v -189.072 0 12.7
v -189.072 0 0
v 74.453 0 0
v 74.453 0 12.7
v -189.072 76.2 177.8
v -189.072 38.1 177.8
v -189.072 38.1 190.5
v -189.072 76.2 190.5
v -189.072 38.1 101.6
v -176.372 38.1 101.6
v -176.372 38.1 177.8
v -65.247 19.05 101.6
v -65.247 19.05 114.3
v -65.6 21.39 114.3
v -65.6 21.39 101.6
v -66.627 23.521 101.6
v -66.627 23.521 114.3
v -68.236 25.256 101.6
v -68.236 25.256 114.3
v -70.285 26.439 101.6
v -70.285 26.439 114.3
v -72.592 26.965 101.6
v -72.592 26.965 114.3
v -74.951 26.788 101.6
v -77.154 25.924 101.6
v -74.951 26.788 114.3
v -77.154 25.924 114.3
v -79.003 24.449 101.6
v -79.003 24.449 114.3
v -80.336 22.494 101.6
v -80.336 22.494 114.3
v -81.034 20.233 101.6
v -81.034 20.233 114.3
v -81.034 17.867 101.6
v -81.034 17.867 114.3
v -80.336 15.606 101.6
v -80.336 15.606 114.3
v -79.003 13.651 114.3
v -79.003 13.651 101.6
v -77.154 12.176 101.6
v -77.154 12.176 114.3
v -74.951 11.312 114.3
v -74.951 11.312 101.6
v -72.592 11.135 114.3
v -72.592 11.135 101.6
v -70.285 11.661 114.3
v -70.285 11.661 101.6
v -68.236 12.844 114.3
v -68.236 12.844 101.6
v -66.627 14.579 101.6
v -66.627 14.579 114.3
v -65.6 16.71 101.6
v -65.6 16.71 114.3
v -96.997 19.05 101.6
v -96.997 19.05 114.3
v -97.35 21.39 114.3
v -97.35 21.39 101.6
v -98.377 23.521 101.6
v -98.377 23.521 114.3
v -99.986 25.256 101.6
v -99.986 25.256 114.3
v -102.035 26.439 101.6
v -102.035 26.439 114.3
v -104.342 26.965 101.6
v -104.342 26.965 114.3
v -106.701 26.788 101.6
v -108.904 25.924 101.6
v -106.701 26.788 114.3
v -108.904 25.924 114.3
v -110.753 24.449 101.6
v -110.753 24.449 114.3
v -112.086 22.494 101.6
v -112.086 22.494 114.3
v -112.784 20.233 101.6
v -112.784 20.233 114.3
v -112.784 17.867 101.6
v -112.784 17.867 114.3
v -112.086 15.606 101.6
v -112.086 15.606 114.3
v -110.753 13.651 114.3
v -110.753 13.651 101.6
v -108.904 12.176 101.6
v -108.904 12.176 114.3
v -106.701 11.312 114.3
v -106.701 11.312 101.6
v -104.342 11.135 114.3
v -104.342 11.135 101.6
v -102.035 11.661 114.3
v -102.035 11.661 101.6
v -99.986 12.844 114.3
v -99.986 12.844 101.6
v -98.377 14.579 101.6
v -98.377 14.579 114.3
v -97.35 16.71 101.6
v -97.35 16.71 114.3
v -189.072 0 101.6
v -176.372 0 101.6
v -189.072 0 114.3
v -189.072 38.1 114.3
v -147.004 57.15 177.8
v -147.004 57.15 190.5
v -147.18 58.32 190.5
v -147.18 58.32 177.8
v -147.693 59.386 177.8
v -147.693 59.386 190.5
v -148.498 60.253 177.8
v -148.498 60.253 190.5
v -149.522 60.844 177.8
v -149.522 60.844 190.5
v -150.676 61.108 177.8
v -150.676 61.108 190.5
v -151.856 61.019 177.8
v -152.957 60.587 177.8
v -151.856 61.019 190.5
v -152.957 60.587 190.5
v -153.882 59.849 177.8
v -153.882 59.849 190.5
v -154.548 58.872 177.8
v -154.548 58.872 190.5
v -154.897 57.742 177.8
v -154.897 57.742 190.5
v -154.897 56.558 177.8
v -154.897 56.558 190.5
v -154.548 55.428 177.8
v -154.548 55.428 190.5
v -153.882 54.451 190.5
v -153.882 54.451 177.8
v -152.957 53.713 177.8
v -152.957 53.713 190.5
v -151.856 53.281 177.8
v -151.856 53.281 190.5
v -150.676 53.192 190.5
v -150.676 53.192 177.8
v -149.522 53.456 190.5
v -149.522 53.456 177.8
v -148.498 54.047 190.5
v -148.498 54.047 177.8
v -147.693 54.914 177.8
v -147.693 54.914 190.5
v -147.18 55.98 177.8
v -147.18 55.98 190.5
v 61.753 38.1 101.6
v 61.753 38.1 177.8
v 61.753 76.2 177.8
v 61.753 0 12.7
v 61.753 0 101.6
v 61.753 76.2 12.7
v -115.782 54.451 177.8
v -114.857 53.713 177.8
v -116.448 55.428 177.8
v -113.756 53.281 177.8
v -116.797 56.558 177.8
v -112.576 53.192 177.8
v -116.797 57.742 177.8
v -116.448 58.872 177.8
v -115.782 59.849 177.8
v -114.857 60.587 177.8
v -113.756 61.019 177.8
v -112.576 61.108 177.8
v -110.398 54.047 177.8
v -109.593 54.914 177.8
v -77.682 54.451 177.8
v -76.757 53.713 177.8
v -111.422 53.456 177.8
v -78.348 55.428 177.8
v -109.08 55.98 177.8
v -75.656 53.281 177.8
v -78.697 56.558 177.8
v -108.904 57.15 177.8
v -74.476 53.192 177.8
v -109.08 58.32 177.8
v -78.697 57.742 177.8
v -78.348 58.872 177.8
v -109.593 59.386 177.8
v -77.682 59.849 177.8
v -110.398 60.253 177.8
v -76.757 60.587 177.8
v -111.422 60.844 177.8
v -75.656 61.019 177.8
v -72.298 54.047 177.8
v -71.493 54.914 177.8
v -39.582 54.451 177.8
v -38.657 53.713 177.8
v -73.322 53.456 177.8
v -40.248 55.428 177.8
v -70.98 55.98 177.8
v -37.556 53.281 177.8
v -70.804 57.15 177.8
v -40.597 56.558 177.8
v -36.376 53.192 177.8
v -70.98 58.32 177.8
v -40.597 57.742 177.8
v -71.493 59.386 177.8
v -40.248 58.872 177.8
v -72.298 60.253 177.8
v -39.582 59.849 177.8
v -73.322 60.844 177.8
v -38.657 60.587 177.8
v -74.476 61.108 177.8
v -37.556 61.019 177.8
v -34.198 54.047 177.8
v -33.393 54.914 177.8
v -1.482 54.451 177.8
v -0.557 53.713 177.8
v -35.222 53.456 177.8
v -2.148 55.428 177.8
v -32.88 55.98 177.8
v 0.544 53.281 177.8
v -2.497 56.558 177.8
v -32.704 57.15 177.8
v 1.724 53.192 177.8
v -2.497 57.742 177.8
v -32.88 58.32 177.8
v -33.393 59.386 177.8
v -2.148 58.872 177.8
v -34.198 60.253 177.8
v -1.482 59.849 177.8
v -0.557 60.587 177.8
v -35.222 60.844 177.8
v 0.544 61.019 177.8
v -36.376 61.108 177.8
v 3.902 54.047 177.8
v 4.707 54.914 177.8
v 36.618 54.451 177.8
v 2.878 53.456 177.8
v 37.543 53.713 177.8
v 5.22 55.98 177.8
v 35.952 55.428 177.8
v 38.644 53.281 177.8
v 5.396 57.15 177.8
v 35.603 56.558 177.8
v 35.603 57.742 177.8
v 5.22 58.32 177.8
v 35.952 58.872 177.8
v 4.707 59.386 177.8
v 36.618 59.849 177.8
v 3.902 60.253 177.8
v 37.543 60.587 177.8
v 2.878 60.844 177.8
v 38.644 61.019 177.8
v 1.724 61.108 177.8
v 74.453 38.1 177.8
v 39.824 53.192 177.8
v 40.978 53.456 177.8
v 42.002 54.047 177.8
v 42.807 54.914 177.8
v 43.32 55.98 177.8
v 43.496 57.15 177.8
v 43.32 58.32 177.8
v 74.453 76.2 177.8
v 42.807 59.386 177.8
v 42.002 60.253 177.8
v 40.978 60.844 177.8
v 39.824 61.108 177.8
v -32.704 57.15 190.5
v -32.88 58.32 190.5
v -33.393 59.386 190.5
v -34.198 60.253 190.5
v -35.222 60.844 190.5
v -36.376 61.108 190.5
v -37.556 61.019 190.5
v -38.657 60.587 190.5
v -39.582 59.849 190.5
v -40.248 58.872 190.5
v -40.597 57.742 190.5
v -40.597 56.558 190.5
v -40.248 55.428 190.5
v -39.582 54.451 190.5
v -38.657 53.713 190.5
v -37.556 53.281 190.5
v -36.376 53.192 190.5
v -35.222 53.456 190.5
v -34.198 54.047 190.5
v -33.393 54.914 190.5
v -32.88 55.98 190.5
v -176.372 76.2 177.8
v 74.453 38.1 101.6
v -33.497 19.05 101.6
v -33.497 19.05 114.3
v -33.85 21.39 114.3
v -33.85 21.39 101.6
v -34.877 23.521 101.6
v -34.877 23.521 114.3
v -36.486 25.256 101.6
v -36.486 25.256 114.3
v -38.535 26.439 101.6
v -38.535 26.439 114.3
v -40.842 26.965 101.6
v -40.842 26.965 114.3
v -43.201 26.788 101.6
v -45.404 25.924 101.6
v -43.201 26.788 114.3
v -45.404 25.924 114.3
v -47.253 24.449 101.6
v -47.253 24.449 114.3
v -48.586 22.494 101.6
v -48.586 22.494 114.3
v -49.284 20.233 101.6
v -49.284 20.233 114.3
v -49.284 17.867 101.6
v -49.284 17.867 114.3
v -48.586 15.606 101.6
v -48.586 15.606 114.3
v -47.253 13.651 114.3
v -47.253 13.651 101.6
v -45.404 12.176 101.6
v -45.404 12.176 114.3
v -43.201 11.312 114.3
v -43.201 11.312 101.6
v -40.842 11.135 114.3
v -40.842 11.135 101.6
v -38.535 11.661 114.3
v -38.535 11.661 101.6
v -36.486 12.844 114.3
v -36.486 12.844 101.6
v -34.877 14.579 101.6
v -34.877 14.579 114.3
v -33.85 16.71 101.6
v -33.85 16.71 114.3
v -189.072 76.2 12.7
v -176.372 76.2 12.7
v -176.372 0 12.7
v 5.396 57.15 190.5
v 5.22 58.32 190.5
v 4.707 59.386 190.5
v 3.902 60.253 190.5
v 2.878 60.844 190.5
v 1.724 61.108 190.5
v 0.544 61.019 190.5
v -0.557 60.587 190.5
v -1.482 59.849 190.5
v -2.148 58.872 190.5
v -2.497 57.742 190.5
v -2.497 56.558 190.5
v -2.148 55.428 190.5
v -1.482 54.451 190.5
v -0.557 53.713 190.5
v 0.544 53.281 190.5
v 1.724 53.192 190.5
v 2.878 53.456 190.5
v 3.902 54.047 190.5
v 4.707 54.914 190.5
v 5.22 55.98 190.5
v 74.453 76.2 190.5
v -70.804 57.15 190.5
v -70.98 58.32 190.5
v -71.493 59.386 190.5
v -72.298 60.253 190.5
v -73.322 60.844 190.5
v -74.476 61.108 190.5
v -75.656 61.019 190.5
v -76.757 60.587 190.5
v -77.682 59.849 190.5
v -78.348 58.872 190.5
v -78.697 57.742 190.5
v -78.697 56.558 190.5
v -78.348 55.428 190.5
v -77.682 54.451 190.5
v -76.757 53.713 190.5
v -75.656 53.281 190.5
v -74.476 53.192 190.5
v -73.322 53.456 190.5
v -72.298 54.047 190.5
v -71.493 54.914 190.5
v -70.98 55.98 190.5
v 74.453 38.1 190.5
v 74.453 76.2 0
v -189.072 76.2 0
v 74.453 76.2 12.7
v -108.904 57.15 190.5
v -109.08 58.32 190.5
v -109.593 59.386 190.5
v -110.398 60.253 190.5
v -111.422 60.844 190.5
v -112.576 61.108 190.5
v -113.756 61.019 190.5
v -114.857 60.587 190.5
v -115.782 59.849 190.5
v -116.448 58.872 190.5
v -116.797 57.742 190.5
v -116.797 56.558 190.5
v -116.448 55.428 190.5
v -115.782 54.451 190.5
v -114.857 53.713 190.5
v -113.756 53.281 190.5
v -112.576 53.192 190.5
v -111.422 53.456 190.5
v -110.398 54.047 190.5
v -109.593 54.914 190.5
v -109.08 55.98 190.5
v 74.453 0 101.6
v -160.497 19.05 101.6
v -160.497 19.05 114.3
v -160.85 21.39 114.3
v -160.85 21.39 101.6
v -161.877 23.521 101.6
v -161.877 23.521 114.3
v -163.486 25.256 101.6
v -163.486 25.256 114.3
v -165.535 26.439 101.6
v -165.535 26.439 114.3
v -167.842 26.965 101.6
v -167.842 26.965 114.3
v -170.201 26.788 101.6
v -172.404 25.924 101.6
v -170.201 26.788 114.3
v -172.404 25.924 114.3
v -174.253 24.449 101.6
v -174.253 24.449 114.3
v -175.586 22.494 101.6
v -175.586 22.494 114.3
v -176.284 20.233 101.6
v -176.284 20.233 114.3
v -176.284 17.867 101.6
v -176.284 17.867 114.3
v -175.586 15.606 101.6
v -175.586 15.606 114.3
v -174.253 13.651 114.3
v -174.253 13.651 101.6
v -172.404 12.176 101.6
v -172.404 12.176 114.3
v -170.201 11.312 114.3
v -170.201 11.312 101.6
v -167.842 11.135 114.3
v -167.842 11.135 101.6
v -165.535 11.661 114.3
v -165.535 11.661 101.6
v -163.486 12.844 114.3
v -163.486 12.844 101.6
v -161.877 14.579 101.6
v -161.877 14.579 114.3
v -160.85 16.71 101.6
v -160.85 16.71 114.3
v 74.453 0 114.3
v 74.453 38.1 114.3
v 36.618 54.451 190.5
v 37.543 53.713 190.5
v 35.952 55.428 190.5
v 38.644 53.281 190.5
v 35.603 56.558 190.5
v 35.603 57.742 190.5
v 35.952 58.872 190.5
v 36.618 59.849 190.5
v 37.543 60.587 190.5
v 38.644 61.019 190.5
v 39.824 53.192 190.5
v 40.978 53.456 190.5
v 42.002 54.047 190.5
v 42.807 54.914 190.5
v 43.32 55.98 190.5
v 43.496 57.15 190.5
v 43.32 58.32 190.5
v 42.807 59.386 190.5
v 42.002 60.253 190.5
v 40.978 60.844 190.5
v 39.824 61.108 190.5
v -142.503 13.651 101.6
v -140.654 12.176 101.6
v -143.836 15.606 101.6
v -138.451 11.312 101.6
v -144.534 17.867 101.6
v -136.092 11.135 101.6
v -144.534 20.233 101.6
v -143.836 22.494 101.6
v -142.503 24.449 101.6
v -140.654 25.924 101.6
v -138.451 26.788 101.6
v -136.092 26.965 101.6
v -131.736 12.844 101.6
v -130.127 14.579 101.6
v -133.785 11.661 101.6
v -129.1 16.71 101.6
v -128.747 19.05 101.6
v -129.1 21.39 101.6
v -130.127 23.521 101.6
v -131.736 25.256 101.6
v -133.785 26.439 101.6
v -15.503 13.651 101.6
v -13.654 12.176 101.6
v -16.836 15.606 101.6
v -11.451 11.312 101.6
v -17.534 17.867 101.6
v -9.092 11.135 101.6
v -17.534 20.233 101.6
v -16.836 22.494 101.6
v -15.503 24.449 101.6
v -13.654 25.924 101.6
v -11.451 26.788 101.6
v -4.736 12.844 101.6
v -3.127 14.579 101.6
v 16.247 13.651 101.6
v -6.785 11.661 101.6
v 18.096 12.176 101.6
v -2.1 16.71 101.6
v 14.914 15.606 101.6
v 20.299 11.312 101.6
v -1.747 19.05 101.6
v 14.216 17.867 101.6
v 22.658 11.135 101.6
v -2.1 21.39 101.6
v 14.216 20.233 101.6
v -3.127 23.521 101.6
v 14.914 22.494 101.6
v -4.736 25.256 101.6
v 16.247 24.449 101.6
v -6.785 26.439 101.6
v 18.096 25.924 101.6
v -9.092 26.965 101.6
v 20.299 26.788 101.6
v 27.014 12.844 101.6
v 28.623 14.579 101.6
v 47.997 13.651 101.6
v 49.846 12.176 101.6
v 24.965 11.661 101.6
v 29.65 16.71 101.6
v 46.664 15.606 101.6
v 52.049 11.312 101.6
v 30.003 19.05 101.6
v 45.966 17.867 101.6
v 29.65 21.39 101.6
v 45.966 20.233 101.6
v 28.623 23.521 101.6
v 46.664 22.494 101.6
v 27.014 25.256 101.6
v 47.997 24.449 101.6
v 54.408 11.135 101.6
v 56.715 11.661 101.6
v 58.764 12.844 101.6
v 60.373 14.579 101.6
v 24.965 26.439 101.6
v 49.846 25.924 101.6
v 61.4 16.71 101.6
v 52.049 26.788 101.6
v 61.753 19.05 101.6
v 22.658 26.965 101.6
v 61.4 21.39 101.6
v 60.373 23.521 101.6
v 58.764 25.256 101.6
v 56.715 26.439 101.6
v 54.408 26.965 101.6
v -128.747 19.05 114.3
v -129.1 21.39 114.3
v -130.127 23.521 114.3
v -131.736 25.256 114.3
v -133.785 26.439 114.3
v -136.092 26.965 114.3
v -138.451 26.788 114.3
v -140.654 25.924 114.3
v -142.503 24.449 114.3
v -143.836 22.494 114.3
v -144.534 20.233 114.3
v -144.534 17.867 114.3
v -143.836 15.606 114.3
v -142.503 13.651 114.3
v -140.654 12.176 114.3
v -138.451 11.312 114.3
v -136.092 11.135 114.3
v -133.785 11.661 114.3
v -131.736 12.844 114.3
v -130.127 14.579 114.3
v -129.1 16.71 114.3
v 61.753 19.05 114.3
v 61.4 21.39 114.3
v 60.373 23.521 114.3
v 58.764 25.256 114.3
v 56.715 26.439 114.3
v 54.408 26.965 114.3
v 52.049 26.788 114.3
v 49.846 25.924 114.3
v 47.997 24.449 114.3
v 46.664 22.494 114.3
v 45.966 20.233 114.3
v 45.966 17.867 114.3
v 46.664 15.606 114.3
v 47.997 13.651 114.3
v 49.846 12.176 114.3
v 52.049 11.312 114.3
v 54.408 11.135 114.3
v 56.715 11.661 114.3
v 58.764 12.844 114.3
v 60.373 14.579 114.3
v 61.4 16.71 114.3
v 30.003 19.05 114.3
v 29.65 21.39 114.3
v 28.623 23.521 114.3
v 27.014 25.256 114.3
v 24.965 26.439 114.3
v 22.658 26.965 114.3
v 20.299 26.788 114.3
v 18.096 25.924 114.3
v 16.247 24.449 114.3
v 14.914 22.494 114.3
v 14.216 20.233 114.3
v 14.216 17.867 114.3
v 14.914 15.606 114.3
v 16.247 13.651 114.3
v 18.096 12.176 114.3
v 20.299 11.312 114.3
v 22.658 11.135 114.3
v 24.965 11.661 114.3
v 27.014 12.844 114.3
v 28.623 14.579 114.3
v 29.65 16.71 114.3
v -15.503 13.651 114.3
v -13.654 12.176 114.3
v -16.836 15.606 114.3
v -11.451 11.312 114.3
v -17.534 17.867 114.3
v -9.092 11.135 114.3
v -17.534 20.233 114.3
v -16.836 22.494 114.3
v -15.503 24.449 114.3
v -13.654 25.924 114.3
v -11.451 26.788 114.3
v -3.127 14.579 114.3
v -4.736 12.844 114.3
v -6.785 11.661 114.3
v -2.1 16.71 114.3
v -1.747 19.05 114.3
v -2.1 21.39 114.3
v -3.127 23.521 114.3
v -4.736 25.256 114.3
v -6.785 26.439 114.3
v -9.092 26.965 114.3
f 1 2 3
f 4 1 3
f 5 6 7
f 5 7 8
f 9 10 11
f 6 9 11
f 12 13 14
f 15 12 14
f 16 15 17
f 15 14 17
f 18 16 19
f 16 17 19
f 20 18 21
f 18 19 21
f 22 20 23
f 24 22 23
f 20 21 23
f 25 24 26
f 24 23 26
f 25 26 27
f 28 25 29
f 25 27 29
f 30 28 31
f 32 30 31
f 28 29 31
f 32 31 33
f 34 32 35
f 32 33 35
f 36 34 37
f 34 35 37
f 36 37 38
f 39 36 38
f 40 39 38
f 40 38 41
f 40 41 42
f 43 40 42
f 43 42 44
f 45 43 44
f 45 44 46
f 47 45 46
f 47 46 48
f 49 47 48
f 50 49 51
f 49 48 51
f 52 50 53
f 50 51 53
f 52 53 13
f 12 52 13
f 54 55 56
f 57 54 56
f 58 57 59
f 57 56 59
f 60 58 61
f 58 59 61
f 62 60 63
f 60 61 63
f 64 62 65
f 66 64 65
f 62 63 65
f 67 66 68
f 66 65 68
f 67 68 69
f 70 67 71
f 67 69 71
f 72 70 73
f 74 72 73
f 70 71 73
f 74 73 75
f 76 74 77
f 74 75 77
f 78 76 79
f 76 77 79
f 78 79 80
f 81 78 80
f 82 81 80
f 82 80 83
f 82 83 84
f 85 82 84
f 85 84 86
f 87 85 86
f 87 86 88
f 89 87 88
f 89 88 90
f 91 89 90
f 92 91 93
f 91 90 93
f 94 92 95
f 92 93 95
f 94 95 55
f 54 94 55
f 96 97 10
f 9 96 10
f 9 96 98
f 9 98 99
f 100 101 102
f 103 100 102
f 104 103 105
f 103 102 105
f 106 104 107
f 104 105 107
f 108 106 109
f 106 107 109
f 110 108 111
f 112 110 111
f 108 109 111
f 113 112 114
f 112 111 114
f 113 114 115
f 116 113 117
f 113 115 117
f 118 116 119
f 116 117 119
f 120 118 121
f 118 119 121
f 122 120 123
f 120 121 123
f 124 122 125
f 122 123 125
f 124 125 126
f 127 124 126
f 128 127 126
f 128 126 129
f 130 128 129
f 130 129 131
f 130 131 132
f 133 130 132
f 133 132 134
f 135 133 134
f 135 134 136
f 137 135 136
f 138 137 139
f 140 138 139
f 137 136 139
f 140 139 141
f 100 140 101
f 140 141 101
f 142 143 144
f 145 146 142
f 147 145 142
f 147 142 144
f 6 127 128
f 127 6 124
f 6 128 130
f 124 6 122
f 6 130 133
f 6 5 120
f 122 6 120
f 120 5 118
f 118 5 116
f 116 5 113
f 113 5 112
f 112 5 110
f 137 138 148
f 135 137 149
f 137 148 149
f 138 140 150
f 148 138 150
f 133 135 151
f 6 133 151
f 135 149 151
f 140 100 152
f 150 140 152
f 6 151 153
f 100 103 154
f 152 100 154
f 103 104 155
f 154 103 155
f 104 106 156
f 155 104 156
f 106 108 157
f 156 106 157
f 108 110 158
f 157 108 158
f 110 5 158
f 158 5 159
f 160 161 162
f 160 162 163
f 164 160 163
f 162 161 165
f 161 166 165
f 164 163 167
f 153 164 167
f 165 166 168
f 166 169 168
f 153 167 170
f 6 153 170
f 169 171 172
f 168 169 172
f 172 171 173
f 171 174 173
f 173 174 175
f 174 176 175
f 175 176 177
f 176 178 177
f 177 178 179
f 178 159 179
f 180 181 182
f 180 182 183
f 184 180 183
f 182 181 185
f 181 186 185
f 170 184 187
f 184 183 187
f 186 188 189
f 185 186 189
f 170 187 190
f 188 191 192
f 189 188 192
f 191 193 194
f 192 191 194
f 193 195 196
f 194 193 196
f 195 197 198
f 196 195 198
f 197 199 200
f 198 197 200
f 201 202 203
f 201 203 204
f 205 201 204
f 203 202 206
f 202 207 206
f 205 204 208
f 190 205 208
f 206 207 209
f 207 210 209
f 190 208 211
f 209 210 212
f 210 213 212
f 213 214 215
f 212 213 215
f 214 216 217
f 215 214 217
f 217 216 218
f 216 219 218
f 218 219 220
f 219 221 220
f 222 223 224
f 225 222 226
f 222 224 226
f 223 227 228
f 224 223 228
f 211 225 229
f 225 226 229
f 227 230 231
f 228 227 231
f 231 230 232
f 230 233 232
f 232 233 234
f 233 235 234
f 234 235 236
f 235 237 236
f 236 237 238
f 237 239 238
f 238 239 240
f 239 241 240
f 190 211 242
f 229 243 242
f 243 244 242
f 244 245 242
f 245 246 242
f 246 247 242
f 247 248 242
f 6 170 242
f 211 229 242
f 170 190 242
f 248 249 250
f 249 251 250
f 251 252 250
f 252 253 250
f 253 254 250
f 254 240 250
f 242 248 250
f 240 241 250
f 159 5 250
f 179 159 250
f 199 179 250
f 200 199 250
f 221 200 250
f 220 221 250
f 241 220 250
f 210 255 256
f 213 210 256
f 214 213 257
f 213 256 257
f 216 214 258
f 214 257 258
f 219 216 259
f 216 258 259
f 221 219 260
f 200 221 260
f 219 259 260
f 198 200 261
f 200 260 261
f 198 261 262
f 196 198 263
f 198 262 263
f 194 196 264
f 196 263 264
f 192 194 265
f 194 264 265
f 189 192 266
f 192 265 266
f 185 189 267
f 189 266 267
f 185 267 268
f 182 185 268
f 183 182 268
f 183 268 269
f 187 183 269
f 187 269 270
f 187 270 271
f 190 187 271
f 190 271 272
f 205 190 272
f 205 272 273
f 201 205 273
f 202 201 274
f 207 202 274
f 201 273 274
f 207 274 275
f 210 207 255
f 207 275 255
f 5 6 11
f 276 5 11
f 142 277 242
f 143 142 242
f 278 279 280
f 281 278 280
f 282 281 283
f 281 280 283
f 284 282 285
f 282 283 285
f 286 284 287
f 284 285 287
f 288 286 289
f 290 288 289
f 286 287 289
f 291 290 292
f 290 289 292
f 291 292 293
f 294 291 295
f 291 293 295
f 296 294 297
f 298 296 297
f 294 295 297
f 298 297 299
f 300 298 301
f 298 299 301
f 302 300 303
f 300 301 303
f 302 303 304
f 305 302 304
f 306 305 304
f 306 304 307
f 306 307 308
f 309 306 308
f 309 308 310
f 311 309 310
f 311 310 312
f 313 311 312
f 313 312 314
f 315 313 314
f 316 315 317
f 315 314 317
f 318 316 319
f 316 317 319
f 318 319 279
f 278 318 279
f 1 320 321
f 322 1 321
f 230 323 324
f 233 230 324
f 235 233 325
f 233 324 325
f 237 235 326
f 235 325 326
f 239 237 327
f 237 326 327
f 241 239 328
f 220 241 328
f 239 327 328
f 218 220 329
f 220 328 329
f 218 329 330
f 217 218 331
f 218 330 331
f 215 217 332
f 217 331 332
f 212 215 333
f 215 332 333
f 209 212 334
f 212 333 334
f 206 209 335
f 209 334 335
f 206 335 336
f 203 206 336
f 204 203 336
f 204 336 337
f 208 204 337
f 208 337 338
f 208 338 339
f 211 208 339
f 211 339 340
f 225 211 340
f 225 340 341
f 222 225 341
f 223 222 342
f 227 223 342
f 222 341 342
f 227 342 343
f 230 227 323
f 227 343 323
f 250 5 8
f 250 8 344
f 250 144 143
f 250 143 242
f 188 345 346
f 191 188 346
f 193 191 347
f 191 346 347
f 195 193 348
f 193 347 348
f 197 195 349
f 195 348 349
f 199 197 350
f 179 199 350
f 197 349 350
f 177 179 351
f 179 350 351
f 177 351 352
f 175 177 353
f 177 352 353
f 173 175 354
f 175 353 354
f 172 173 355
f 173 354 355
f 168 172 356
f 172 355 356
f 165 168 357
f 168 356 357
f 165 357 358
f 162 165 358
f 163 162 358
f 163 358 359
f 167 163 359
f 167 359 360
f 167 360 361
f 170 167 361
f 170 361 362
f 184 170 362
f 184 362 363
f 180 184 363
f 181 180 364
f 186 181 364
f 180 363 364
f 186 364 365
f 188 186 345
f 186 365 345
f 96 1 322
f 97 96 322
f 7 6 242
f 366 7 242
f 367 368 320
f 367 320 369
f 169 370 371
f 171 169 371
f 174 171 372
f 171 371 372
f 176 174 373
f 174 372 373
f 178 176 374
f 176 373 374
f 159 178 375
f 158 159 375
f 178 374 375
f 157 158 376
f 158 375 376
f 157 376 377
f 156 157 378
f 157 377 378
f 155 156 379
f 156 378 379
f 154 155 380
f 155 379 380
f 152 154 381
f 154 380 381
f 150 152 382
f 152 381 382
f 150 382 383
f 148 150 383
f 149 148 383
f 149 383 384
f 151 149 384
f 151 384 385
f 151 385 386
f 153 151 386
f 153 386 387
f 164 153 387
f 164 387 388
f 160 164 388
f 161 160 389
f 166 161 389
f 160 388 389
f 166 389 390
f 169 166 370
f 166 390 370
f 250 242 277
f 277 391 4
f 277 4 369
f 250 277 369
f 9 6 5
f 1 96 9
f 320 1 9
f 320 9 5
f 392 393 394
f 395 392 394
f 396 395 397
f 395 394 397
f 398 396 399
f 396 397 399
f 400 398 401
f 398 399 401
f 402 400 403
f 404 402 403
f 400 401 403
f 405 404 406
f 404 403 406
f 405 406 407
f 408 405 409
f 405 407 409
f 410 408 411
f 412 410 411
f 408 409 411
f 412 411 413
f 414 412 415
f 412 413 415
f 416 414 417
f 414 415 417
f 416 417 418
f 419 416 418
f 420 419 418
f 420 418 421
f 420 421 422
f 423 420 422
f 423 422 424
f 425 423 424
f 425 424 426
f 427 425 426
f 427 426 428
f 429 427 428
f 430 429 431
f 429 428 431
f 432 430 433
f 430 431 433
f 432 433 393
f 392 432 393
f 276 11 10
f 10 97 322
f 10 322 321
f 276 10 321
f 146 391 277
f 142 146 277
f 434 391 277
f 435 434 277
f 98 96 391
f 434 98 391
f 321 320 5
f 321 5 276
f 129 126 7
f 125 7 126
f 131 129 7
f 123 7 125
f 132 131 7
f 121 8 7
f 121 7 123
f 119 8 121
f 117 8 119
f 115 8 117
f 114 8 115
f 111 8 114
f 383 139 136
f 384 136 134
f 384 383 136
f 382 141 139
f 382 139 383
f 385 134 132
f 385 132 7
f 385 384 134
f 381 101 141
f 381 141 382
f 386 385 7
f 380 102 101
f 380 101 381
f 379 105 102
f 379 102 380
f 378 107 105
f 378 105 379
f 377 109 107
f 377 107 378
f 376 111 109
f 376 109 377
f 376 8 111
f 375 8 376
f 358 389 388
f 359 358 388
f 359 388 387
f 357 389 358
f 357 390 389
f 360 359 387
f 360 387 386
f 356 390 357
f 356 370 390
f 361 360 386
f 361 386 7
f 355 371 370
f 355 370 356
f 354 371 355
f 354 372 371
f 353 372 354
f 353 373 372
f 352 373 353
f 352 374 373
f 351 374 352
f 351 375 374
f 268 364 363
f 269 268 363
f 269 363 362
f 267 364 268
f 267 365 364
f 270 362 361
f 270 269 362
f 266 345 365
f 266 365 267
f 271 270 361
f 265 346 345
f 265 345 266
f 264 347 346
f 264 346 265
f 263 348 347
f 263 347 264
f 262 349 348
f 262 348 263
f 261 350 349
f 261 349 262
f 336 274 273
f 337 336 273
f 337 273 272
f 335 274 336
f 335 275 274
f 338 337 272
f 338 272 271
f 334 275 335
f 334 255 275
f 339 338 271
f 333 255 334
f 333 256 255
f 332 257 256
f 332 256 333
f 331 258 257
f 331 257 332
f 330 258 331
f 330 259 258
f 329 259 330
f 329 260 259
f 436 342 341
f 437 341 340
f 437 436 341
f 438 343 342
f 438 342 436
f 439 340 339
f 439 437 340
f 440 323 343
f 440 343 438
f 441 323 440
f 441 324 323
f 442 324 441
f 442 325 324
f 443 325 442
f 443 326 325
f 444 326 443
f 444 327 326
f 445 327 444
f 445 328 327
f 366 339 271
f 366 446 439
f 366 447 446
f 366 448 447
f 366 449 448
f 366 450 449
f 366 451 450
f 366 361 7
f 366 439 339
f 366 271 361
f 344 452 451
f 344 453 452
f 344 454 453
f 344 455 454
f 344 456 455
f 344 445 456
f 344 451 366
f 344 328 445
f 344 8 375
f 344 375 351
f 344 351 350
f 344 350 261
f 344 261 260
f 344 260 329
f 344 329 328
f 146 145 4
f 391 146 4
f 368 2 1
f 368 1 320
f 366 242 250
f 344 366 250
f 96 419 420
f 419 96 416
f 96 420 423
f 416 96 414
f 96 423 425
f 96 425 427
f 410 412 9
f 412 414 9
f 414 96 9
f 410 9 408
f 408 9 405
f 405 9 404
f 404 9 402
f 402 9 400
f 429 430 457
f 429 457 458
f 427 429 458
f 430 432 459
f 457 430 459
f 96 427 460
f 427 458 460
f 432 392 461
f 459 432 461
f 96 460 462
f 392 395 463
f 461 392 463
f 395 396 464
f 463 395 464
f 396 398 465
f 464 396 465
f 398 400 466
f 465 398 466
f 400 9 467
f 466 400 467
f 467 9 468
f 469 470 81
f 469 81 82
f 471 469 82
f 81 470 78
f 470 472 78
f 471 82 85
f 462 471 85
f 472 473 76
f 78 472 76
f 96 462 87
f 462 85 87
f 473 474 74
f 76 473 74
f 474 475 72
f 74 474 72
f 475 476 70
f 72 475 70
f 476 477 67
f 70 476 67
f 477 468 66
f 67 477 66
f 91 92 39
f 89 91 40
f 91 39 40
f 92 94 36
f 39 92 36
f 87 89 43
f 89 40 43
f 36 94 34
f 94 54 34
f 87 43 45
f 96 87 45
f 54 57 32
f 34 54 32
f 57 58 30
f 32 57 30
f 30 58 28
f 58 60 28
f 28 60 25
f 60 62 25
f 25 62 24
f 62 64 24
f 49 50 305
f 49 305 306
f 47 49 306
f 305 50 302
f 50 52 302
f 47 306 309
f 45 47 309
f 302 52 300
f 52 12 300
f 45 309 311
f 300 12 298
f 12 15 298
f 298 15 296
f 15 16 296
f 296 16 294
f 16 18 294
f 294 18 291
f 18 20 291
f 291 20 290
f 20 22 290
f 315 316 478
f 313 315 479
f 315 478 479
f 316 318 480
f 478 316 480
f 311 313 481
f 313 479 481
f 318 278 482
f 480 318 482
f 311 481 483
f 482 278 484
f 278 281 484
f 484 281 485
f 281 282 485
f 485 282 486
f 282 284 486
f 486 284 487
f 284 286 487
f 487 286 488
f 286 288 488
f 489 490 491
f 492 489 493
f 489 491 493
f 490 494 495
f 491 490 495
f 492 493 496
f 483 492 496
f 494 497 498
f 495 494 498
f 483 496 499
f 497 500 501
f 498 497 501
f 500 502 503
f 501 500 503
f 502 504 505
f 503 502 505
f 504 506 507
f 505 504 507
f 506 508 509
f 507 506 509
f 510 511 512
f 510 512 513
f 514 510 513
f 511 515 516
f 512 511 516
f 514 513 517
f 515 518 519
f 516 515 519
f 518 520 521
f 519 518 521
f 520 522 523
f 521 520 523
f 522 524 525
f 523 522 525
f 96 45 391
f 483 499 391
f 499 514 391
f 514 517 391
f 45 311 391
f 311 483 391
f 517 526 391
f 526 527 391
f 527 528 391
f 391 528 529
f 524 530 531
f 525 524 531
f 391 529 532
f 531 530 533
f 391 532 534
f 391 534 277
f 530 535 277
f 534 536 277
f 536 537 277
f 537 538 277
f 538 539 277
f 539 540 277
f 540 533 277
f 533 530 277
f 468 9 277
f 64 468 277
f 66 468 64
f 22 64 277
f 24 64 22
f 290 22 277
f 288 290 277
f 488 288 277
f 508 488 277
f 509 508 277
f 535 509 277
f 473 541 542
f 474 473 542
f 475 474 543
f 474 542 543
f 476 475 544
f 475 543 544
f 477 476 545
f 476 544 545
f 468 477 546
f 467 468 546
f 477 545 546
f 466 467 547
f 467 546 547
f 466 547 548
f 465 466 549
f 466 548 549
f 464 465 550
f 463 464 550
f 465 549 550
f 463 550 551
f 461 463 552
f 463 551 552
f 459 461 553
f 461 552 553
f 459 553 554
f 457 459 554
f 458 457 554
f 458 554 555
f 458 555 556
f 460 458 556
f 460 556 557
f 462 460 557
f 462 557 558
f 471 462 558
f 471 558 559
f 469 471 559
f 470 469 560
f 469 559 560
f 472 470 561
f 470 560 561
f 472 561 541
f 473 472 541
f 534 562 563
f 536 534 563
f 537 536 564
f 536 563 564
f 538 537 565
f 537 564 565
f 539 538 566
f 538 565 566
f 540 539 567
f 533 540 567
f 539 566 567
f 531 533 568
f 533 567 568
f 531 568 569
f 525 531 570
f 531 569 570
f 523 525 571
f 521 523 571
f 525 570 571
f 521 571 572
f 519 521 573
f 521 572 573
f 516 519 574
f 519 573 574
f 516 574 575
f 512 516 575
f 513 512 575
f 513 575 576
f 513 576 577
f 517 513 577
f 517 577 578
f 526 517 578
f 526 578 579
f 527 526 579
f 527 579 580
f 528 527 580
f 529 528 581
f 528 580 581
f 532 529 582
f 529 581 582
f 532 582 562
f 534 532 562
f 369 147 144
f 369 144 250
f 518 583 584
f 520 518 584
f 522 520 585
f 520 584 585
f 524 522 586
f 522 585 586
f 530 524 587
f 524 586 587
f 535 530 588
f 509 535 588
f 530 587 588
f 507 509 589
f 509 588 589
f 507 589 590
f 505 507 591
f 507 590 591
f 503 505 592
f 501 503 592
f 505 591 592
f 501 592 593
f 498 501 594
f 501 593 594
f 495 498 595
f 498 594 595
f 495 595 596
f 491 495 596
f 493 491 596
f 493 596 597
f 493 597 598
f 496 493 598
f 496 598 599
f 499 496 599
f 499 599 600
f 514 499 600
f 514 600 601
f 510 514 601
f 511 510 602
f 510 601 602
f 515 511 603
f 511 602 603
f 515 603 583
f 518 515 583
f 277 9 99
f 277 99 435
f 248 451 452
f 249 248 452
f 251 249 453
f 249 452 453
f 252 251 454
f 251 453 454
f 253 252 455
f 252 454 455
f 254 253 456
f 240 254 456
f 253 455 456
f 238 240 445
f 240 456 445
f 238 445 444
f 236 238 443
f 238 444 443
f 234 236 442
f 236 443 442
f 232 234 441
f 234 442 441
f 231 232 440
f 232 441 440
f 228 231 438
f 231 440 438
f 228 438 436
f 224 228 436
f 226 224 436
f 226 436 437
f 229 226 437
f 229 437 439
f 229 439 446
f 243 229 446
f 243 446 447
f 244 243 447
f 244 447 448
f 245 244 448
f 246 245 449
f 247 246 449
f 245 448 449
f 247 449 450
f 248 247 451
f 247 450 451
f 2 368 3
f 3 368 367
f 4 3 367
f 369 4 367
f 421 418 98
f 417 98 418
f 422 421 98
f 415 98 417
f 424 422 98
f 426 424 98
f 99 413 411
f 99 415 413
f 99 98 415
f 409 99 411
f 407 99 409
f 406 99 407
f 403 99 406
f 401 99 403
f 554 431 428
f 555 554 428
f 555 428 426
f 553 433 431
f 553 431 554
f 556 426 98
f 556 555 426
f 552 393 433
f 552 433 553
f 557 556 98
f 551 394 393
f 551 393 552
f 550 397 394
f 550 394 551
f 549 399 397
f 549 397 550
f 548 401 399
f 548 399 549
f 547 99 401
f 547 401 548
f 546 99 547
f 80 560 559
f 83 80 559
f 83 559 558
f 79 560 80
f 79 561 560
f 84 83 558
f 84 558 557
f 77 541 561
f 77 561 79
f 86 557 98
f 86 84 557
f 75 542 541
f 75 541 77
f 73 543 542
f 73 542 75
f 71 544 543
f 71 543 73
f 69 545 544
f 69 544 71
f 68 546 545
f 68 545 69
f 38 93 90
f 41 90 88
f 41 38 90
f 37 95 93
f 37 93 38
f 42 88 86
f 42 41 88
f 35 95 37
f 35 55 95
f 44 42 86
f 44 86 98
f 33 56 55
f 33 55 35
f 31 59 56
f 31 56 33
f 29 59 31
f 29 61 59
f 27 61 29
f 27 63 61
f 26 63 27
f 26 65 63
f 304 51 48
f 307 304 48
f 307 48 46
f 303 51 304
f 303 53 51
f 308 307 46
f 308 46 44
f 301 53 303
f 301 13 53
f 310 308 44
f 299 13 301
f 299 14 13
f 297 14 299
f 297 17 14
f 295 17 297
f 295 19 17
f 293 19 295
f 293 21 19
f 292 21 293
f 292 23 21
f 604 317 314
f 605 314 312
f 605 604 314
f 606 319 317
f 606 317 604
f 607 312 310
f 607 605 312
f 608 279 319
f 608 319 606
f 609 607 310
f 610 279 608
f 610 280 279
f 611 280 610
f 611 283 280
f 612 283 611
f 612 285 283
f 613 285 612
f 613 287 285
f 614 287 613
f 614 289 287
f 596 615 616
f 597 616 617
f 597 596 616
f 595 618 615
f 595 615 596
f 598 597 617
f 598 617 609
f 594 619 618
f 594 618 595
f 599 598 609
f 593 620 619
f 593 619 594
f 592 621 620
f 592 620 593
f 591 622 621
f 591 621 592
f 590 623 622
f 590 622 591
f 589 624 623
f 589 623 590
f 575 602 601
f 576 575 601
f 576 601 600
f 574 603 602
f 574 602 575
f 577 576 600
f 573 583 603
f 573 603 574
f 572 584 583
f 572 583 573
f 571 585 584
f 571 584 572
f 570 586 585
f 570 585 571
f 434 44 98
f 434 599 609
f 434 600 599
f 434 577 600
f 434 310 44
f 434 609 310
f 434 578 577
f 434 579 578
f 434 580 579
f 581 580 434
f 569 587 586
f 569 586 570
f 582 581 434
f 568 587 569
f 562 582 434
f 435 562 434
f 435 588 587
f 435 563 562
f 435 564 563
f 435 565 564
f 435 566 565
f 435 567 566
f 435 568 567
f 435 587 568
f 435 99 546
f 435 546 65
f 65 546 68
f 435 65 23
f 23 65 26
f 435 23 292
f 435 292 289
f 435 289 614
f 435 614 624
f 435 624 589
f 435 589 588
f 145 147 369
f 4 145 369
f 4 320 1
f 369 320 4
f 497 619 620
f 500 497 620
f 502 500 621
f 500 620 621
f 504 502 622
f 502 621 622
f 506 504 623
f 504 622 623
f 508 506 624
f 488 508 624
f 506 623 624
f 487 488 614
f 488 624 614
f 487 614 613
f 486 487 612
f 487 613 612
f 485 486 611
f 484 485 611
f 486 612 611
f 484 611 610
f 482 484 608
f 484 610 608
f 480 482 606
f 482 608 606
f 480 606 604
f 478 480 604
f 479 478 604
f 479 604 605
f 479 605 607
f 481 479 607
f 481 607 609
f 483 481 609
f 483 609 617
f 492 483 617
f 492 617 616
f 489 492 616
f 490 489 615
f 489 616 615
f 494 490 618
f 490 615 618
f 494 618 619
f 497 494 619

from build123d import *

# Parameters (mm, degrees)
F0_W      = 263.525
F0_H      = 76.2
F1_DEPTH  = 12.7
F2_W      = 12.7
F2_H      = 76.2
F3_DEPTH  = 165.1
F4_W      = 38.1
F4_H      = 76.2
F5_DEPTH  = 12.7
F6_W      = 12.7
F6_H      = 76.2
F7_DEPTH  = 165.1
F8_W      = 38.1
F8_H      = 76.2
F9_DEPTH  = 12.7
F10_W     = 263.525
F10_H     = 38.1
F11_DEPTH = 12.7
F12_W     = 263.525
F12_H     = 38.1
F13_DEPTH = 12.7
F14_R     = 7.9375
F15_DEPTH = 12.7
F16_R     = 3.96875
F17_DEPTH = 12.7


with BuildPart() as f1:
    # F0 (on Top) → F1 (new body)
    with BuildSketch(Plane.XY):
        with Locations((-57.3099, 38.1)):
            Rectangle(F0_W, F0_H)
    extrude(amount=F1_DEPTH)


with BuildPart() as f3:
    # F2 (on face) → F3 (new body)
    with BuildSketch(Plane.XY.offset(12.7)):
        with Locations((-182.7224, 38.1)):
            Rectangle(F2_W, F2_H)
    extrude(amount=F3_DEPTH)

    # F4 (on face) → F5 (cut, through all)
    with BuildSketch(Plane.YZ.offset(-176.3724)):
        with Locations((19.05, 139.7)):
            Rectangle(F4_W, F4_H)
    extrude(amount=-F5_DEPTH, mode=Mode.SUBTRACT)


with BuildPart() as f7:
    # F6 (on face) → F7 (new body)
    with BuildSketch(Plane.XY.offset(12.7)):
        with Locations((68.1026, 38.1)):
            Rectangle(F6_W, F6_H)
    extrude(amount=F7_DEPTH)

    # F8 (on face) → F9 (cut, through all)
    with BuildSketch(Plane.YZ.offset(74.4526)):
        with Locations((19.05, 139.7)):
            Rectangle(F8_W, F8_H)
    extrude(amount=-F9_DEPTH, mode=Mode.SUBTRACT)


with BuildPart() as f11:
    # F10 (on face) → F11 (new body)
    with BuildSketch(Plane.XY.offset(177.8)):
        with Locations((-57.3099, 57.15)):
            Rectangle(F10_W, F10_H)
    extrude(amount=F11_DEPTH)

    # F16 (on face) → F17 (cut, through all)
    with BuildSketch(Plane.XY.offset(190.5)):
        with Locations((-150.9724, 57.15)):
            Circle(F16_R)
        with Locations((1.4276, 57.15)):
            Circle(F16_R)
        with Locations((-112.8724, 57.15)):
            Circle(F16_R)
        with Locations((-74.7724, 57.15)):
            Circle(F16_R)
        with Locations((-36.6724, 57.15)):
            Circle(F16_R)
        with Locations((39.5276, 57.15)):
            Circle(F16_R)
    extrude(amount=-F17_DEPTH, mode=Mode.SUBTRACT)


with BuildPart() as f13:
    # F12 (on face) → F13 (new body)
    with BuildSketch(Plane.XY.offset(101.6)):
        with Locations((-57.3099, 19.05)):
            Rectangle(F12_W, F12_H)
    extrude(amount=F13_DEPTH)

    # F14 (on face) → F15 (cut, through all)
    with BuildSketch(Plane.XY.offset(114.3)):
        with Locations((-168.4349, 19.05)):
            Circle(F14_R)
        with Locations((-136.6849, 19.05)):
            Circle(F14_R)
        with Locations((-104.9349, 19.05)):
            Circle(F14_R)
        with Locations((-73.1849, 19.05)):
            Circle(F14_R)
        with Locations((-41.4349, 19.05)):
            Circle(F14_R)
        with Locations((-9.6849, 19.05)):
            Circle(F14_R)
        with Locations((22.0651, 19.05)):
            Circle(F14_R)
        with Locations((53.8151, 19.05)):
            Circle(F14_R)
    extrude(amount=-F15_DEPTH, mode=Mode.SUBTRACT)


solid = Compound([f1.part, f3.part, f7.part, f11.part, f13.part])
